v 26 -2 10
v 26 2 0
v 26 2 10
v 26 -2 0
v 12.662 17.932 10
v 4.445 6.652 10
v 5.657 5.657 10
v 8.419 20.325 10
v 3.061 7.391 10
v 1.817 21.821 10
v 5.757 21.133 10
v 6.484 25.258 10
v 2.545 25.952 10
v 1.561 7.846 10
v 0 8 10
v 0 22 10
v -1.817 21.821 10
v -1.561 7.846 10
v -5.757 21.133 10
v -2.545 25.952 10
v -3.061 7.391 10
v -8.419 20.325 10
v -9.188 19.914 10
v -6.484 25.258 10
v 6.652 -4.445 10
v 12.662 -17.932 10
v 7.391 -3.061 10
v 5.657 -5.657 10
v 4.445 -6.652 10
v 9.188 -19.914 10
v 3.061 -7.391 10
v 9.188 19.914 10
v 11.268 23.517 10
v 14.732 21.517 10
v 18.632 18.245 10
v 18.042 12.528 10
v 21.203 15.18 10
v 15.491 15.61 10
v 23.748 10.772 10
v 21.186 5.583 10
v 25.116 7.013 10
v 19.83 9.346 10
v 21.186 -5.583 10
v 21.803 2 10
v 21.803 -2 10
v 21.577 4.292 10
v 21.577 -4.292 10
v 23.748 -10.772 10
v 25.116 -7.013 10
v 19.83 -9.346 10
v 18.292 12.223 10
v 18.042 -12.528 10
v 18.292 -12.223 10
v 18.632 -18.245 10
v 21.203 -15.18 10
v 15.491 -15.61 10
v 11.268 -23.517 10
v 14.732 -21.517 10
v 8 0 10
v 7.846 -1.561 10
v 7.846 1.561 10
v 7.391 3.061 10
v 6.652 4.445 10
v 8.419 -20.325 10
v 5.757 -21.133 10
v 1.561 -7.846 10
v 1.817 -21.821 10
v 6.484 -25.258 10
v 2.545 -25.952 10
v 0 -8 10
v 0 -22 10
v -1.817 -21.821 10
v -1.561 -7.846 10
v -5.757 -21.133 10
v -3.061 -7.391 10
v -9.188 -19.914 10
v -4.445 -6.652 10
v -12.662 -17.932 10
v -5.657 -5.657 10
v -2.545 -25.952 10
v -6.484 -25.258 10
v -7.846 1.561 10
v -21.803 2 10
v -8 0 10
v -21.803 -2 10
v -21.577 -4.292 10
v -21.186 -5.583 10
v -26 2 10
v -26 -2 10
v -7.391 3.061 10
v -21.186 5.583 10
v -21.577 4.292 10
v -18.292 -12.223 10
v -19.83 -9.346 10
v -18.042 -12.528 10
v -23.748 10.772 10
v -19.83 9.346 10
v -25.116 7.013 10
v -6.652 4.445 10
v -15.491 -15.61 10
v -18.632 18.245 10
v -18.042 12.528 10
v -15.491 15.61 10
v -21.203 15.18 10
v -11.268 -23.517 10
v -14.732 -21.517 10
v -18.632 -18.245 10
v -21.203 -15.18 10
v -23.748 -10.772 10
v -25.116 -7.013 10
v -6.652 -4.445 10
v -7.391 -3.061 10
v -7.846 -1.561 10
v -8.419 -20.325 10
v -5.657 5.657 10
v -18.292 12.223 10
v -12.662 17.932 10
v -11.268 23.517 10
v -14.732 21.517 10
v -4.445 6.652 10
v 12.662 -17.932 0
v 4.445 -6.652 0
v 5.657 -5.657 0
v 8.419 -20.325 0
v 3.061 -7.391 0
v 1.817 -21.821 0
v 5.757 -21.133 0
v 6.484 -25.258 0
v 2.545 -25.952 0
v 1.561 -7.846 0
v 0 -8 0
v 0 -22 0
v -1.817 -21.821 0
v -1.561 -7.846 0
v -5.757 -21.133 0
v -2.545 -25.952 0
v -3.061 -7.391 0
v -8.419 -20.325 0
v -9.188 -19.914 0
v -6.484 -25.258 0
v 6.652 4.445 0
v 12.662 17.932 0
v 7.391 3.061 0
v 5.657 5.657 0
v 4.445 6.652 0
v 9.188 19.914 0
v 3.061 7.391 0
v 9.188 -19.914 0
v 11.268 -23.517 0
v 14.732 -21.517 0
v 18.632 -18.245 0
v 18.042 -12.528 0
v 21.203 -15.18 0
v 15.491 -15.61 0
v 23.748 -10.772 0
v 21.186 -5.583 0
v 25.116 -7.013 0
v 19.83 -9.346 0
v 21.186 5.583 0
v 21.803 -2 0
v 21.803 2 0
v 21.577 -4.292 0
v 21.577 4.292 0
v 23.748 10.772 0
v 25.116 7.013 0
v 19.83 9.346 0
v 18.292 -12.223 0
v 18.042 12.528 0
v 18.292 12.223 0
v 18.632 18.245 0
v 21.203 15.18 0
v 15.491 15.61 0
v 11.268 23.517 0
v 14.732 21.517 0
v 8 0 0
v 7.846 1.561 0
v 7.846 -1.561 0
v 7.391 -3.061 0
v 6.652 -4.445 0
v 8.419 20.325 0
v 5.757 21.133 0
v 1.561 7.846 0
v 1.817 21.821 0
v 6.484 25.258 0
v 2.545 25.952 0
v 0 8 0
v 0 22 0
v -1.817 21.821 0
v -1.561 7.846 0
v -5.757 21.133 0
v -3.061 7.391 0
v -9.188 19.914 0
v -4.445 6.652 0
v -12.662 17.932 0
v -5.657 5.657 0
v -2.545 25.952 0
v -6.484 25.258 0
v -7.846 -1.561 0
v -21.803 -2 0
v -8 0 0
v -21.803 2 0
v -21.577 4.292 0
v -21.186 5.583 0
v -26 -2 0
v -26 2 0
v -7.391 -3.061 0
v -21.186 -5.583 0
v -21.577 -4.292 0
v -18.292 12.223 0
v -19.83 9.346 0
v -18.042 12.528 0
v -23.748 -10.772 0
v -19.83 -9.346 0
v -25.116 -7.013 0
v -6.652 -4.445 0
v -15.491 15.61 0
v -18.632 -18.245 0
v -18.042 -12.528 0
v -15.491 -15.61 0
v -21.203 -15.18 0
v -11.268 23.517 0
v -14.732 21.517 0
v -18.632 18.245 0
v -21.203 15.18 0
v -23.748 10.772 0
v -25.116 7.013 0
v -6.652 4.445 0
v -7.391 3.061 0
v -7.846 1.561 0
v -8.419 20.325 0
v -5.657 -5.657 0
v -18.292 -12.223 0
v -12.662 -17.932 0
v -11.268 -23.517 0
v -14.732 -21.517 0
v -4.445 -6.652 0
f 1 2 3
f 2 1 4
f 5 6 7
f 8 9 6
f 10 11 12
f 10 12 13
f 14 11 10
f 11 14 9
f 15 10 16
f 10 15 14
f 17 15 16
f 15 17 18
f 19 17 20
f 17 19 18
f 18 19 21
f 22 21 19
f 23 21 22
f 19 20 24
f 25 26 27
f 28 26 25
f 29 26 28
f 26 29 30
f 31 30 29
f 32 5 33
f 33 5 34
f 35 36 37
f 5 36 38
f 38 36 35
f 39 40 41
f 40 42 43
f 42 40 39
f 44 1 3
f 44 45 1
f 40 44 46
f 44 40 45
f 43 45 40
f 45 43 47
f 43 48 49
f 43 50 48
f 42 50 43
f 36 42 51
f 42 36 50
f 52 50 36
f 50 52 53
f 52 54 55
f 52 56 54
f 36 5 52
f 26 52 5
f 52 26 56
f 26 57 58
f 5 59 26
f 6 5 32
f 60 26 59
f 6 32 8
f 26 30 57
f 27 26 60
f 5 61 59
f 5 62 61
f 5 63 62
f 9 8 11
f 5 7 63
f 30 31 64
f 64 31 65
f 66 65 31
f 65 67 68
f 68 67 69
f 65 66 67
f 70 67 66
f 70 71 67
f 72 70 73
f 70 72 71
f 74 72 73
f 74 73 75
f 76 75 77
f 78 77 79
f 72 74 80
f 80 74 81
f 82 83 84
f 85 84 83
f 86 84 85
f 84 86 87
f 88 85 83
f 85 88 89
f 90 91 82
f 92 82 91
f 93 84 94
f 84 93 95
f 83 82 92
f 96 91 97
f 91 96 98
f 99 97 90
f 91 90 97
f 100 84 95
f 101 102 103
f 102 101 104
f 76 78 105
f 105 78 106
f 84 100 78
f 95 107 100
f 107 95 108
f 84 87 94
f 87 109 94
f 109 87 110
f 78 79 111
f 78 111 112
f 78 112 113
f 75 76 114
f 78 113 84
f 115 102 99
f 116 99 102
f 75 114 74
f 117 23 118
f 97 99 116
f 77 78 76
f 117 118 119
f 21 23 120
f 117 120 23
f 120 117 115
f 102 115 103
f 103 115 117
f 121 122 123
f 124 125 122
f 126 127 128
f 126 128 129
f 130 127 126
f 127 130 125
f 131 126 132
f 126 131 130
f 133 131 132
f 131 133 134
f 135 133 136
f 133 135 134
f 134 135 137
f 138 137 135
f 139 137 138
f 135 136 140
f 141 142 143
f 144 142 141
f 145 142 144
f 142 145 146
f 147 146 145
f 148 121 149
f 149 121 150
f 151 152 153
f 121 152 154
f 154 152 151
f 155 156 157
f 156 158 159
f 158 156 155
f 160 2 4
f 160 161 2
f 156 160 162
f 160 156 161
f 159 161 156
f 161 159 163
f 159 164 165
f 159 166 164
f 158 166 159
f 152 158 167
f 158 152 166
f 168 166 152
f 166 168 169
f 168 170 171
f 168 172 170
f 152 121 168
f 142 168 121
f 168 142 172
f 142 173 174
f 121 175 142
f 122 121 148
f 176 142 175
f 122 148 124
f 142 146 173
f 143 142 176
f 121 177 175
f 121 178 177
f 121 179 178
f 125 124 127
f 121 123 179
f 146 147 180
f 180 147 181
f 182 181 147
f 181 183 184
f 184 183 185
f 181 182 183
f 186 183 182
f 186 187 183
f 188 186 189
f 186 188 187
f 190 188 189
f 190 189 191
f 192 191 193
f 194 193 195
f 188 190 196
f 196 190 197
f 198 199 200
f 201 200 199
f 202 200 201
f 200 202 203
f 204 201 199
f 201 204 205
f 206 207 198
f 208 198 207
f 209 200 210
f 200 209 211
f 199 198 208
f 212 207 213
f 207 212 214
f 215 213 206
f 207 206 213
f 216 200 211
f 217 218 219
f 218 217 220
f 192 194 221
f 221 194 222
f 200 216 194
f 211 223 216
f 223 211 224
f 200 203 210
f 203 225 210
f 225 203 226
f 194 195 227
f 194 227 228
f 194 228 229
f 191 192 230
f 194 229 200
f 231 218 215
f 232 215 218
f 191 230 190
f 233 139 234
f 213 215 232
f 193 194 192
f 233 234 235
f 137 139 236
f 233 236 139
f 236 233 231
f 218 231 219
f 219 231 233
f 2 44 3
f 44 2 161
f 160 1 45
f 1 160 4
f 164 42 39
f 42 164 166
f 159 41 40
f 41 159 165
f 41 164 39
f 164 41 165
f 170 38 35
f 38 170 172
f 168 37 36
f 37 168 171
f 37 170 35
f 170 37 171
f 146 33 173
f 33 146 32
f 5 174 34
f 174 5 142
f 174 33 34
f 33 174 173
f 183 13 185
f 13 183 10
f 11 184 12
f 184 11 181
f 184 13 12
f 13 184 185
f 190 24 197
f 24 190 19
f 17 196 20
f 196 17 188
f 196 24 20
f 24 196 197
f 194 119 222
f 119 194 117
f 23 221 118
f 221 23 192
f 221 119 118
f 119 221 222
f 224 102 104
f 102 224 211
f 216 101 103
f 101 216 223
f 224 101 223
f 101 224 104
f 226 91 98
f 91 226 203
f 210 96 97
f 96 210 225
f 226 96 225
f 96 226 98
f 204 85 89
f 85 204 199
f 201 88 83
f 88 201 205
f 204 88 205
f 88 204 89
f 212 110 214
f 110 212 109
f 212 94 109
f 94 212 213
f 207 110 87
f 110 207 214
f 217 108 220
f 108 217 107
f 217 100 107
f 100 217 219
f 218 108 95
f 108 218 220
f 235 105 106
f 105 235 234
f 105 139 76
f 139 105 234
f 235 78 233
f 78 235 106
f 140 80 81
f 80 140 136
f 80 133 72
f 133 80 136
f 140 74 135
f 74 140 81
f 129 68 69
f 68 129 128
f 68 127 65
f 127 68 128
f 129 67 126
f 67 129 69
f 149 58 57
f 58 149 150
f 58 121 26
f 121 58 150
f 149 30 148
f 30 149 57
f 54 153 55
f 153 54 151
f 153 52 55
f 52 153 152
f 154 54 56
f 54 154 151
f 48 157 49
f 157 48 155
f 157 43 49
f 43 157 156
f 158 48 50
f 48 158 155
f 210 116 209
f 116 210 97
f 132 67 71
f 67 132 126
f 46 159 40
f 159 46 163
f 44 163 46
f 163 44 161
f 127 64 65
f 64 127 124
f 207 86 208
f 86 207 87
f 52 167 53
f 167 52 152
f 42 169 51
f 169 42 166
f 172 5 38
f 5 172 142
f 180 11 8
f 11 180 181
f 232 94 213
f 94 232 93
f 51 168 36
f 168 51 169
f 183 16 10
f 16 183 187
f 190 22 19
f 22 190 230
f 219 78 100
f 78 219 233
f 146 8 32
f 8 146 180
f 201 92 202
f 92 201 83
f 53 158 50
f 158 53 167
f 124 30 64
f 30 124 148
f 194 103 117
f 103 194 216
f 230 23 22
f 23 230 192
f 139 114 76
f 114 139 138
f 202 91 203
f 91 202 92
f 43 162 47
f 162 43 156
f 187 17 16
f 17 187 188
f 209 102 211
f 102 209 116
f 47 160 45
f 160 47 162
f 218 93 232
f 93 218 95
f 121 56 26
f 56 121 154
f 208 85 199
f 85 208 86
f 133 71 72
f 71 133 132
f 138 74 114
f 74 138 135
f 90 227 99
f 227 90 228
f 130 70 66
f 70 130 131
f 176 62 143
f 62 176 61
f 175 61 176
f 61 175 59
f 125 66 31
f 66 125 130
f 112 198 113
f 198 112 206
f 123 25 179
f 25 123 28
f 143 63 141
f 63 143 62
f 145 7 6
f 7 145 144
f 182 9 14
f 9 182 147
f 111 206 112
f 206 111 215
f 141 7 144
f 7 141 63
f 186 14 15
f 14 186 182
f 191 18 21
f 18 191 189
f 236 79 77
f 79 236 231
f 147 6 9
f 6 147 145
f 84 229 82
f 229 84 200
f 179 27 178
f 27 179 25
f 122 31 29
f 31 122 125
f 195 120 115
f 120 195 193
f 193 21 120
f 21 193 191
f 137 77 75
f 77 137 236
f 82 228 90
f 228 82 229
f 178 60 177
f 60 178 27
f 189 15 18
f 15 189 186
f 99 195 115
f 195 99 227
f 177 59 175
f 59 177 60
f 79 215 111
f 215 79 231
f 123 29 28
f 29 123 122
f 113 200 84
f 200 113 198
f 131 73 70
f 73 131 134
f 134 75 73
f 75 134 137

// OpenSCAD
$fn = 32;

// ----------------------------------------------------------------------
// Spur blank: bored gear blank
// ----------------------------------------------------------------------

// --- parameters (mm) ---
disc_r = 22;              // blank root radius
disc_t = 10;              // blank thickness
n_teeth = 18;             // stub tooth count
tooth_w = 4;              // tooth width at the root
tooth_h = 4;              // tooth height above the root
bore_r = 8;               // central bore radius

out_r = disc_r + tooth_h;  // tip radius
bbox_x = 52.0;  // measured width over the teeth
bbox_y = 51.9;  // measured depth over the teeth

difference() {
union() {
  cylinder(r = disc_r, h = disc_t);
  for (i = [0 : n_teeth - 1])
    rotate([0, 0, i * 360 / n_teeth])
      translate([disc_r - 1, -tooth_w / 2, 0])
        cube([tooth_h + 1, tooth_w, disc_t]);
}
  translate([0, 0, -1]) cylinder(r = bore_r, h = disc_t + 2);
}
